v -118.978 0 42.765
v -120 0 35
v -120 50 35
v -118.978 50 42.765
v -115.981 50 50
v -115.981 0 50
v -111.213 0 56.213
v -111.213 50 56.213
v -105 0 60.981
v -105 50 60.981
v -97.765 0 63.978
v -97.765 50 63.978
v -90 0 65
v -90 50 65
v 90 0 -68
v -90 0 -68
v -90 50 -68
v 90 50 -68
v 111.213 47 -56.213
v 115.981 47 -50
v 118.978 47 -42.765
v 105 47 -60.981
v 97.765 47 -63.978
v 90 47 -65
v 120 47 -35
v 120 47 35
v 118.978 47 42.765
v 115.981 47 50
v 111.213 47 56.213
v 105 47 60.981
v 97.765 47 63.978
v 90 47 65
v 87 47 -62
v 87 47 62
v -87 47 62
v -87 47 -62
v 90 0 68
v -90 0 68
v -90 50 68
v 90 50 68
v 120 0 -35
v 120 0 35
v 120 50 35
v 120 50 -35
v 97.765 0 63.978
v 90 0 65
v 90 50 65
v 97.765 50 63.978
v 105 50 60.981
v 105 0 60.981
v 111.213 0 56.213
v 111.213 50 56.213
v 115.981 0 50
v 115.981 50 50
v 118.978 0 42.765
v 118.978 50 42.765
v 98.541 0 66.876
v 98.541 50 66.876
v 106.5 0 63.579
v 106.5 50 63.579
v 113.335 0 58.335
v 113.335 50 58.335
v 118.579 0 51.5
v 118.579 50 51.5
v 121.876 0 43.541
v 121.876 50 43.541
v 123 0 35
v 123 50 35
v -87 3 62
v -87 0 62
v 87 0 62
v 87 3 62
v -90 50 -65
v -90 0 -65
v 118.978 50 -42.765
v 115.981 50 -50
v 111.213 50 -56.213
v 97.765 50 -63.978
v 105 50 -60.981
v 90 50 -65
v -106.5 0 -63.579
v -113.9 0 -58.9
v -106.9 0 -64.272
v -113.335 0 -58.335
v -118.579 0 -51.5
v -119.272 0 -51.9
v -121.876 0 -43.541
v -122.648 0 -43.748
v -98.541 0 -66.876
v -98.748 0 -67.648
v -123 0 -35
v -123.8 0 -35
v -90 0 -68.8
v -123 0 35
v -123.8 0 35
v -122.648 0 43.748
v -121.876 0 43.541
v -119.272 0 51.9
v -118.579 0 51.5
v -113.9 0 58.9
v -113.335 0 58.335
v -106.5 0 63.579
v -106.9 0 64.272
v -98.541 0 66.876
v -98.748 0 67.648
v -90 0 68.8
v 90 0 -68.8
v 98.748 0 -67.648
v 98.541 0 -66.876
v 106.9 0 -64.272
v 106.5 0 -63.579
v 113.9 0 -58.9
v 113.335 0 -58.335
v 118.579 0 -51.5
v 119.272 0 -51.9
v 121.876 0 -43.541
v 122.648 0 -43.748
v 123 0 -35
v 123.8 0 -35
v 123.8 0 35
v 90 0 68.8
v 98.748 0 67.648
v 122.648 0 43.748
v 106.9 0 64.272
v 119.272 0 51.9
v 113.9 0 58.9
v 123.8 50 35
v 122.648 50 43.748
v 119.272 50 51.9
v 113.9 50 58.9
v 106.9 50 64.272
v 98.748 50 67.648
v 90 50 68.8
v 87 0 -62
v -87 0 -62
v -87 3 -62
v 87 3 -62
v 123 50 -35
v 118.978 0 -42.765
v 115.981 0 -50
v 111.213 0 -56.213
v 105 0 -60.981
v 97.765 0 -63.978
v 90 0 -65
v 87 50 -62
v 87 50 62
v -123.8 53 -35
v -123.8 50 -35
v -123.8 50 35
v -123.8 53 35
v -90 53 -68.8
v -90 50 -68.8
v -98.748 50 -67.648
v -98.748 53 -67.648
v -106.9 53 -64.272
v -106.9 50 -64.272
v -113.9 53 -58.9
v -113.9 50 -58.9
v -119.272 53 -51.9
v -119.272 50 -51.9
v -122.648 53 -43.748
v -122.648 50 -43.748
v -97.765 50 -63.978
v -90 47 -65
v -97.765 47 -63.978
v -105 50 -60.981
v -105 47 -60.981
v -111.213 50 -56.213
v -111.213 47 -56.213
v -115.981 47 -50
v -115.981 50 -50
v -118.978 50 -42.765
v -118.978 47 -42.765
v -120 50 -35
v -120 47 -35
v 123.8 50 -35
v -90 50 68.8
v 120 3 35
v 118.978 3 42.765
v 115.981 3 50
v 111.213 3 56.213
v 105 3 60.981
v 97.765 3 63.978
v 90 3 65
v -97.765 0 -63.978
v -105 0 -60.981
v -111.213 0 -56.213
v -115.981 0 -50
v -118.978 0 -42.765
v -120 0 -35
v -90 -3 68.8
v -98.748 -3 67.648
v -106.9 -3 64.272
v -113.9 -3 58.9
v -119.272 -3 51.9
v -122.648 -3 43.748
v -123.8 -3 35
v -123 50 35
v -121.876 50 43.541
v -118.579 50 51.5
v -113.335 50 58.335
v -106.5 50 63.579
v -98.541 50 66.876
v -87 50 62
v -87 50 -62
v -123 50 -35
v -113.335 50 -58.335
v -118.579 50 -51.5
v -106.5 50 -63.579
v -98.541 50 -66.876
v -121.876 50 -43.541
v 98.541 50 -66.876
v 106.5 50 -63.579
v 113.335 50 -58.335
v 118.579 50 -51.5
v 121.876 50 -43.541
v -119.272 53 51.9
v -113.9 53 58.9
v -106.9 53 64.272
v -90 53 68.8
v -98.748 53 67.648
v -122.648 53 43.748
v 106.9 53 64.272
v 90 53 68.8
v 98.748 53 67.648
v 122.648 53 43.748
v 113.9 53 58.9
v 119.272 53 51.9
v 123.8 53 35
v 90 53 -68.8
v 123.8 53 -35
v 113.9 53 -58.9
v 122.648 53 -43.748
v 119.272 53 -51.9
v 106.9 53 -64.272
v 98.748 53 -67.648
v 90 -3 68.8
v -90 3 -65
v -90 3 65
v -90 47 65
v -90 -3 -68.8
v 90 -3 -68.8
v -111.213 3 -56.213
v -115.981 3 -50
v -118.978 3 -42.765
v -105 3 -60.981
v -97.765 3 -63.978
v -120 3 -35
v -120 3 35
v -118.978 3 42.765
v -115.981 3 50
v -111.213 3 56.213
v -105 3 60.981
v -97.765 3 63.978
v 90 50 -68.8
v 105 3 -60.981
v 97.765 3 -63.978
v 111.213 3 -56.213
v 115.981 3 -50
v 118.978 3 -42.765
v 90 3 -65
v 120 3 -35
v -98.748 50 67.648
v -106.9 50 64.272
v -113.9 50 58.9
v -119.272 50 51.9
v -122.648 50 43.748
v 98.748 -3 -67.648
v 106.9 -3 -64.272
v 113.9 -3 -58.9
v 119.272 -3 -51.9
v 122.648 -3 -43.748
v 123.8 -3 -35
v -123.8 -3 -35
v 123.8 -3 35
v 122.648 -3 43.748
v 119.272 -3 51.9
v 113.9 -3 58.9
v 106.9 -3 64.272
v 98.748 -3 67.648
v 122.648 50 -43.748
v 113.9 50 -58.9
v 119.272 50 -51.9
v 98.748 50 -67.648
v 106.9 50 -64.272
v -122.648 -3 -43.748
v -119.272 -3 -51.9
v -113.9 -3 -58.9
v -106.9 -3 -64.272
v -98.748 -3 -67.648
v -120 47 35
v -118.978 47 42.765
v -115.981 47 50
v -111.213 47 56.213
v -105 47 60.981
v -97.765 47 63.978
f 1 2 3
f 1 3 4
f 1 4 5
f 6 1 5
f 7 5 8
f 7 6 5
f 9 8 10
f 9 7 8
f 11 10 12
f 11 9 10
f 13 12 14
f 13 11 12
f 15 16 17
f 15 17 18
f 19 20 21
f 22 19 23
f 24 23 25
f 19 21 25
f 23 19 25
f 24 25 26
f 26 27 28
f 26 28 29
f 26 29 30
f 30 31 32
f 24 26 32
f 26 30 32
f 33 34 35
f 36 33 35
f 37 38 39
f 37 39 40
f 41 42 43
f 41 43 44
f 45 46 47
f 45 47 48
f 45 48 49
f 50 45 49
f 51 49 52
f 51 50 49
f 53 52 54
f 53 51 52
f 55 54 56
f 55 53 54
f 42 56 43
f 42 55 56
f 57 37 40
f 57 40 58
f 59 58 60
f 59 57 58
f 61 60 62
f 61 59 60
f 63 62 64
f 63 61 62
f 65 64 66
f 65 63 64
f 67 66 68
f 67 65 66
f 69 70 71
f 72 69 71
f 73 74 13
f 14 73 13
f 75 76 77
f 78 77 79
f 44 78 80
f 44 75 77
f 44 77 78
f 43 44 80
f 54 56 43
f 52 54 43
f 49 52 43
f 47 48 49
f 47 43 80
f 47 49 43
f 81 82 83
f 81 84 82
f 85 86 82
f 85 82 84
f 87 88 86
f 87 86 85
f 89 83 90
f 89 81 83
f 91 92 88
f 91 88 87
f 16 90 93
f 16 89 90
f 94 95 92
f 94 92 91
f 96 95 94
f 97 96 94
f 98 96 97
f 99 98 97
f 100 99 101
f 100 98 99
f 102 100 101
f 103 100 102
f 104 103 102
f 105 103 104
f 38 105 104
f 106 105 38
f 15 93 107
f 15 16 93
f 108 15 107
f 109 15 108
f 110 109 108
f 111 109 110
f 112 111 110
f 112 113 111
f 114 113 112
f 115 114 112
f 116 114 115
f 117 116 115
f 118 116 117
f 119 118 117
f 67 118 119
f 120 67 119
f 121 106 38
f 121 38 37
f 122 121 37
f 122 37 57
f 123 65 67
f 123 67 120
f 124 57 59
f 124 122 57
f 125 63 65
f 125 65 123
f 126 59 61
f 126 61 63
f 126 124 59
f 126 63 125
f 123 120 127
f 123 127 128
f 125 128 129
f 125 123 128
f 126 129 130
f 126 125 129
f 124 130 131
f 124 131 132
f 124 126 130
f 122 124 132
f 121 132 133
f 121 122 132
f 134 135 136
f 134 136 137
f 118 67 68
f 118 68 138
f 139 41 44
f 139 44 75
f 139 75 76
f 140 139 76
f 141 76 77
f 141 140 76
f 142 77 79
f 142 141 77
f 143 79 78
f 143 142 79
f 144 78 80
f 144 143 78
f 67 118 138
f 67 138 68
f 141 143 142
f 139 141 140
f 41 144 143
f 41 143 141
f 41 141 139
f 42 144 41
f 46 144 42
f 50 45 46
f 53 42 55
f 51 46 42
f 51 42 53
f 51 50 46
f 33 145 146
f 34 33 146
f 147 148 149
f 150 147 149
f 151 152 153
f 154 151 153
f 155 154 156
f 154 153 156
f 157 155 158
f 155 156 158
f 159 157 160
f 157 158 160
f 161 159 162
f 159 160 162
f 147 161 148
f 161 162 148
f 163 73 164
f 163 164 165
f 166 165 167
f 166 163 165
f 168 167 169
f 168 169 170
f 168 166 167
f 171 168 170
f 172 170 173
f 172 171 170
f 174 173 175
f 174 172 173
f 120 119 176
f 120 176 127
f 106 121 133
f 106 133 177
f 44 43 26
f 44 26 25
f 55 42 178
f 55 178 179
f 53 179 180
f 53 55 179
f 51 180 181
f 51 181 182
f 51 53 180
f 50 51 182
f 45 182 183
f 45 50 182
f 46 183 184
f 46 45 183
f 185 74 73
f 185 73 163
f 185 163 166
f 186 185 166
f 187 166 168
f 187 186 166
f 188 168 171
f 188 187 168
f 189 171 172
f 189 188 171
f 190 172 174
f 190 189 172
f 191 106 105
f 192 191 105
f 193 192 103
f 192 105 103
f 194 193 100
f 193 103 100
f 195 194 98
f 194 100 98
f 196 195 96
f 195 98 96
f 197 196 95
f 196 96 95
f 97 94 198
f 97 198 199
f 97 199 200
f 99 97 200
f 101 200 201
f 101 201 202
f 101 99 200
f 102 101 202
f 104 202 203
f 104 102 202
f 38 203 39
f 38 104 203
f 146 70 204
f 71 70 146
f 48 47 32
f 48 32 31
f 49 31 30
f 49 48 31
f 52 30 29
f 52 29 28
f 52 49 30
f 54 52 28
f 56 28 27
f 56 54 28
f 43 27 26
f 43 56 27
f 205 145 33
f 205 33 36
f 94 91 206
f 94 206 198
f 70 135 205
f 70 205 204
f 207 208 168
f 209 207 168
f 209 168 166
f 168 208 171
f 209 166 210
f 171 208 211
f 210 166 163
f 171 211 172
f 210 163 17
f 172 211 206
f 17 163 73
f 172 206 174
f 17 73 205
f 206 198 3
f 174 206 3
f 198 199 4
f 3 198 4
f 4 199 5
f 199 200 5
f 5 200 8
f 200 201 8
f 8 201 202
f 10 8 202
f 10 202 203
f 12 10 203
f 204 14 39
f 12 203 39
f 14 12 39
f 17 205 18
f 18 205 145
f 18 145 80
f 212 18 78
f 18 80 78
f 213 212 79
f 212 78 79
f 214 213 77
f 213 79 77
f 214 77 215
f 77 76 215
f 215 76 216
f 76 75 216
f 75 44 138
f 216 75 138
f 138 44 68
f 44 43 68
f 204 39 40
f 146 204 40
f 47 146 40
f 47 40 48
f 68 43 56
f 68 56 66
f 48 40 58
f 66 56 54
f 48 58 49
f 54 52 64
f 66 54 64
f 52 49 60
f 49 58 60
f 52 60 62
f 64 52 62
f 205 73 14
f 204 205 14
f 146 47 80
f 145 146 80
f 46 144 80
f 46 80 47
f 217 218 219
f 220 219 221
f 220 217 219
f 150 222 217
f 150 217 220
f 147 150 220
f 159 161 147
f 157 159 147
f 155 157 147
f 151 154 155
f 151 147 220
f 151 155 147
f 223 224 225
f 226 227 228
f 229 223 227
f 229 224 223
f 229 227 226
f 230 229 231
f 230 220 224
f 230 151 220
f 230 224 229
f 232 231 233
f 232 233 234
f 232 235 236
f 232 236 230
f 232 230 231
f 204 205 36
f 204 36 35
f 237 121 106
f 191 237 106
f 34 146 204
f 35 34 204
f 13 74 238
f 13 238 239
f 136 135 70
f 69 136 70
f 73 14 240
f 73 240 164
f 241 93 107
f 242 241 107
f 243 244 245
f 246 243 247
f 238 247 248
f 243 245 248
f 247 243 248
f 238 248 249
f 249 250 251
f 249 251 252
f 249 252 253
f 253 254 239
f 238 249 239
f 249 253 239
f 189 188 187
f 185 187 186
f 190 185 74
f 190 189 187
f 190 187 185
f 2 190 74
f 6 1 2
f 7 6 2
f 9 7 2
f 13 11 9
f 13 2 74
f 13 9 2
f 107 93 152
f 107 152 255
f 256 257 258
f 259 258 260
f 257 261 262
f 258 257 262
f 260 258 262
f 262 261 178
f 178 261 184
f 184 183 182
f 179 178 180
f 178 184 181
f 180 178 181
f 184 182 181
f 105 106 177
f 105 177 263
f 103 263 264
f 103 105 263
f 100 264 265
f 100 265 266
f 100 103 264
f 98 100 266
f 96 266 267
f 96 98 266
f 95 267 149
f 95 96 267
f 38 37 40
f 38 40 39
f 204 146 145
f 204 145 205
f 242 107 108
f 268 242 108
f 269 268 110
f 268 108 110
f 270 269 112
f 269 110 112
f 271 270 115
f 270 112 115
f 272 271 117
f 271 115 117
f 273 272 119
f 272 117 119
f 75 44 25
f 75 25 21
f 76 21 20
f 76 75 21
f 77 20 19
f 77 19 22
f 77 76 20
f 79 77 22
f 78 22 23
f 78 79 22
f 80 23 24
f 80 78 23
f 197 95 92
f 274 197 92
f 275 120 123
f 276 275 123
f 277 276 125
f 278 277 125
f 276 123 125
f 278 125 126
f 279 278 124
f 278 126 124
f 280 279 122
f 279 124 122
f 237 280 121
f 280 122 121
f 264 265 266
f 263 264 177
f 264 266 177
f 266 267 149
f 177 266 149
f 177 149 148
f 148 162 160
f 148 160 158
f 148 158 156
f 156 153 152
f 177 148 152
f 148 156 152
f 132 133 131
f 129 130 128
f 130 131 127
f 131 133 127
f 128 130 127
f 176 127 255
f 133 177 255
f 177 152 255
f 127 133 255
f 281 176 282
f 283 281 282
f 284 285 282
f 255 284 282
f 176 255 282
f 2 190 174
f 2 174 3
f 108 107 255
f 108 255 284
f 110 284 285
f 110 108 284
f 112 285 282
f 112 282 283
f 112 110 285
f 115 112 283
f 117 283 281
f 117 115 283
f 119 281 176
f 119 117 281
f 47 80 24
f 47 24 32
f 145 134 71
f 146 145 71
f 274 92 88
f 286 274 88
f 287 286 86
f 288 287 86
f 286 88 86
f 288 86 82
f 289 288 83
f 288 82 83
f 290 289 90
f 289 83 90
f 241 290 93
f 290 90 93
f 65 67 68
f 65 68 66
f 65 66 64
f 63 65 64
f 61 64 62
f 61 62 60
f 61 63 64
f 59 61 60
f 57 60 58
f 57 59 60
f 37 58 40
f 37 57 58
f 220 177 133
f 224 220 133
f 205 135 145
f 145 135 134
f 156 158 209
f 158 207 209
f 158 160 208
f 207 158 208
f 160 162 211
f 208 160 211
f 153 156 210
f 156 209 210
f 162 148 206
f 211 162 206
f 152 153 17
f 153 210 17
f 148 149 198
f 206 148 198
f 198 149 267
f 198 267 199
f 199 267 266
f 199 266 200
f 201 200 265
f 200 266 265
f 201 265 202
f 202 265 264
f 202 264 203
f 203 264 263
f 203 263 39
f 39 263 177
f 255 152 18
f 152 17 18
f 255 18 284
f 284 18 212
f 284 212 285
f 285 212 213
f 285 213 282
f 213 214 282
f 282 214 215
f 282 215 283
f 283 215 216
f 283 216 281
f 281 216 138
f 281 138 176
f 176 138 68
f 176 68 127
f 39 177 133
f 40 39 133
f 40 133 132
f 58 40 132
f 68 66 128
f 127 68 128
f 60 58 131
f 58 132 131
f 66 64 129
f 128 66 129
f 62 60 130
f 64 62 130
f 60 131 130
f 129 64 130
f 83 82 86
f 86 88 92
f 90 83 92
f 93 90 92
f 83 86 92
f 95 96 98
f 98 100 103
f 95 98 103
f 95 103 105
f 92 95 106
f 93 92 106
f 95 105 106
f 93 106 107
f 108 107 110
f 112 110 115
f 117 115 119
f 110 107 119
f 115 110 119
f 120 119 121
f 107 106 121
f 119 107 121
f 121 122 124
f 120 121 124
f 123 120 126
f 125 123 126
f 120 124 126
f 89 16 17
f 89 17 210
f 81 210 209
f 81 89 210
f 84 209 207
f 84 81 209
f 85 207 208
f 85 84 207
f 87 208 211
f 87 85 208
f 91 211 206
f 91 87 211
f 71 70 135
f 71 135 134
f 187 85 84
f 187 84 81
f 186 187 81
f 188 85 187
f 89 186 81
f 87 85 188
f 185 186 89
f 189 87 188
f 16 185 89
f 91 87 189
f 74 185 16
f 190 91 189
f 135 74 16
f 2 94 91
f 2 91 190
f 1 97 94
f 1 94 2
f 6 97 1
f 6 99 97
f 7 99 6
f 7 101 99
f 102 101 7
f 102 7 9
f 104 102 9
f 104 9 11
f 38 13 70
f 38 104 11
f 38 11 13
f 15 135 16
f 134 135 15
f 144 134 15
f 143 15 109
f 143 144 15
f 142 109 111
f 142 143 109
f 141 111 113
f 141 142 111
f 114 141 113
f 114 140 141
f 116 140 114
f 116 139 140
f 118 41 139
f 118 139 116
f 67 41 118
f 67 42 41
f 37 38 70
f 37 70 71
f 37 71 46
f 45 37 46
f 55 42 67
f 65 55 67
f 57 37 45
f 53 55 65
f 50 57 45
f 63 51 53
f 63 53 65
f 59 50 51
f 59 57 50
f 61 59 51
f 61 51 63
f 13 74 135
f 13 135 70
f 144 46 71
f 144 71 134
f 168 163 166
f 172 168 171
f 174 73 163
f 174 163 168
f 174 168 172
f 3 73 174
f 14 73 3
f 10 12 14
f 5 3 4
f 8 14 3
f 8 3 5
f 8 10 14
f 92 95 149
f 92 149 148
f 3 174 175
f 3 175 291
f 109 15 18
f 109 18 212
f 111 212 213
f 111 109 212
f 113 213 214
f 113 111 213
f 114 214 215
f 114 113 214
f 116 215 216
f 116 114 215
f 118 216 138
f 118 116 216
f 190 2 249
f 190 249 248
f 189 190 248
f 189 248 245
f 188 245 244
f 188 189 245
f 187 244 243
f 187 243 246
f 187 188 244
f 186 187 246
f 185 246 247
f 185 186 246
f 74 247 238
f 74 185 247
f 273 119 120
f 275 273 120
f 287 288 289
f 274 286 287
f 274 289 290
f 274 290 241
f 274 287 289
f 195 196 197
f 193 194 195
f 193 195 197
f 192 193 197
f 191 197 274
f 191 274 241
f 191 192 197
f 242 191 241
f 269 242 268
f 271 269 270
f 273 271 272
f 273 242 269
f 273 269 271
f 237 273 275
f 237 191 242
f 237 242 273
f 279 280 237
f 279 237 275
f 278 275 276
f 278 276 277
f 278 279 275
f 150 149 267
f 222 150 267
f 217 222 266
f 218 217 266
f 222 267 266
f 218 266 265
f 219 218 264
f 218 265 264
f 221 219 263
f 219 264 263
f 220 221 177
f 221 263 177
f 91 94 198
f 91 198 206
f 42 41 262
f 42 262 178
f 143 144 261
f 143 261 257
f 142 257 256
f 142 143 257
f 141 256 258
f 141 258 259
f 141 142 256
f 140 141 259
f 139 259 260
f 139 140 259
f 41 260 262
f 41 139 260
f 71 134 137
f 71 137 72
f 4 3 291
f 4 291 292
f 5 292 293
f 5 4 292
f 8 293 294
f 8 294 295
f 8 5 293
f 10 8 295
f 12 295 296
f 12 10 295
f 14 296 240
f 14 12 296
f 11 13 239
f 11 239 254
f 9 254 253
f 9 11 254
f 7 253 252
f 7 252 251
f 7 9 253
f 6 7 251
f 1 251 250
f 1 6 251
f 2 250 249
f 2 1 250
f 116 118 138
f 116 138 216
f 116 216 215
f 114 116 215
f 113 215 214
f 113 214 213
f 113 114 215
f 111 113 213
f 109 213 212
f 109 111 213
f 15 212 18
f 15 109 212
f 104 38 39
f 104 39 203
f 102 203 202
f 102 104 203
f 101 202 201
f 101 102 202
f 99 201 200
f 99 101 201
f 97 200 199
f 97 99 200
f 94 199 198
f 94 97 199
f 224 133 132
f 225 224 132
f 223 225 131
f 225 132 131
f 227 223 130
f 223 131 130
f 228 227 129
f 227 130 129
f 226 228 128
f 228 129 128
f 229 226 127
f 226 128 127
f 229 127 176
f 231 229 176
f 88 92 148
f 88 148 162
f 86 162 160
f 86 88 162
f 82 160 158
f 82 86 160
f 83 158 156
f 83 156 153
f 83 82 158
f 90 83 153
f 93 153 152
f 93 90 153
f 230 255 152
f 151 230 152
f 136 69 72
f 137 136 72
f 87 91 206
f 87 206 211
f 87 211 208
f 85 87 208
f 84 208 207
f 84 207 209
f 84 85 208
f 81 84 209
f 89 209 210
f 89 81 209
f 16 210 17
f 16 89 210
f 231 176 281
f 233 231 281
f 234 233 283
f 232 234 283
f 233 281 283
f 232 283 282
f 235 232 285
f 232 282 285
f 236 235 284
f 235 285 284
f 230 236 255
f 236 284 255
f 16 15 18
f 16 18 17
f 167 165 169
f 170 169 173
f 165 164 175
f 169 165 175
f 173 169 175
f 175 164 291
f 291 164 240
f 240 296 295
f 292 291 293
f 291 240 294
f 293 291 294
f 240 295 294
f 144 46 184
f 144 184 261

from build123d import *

# Parameters (mm, degrees)
F0_W     = 180
F0_H     = 130
F0_W_2   = 174
F0_H_2   = 124
F1_DEPTH = 50
F2_DEPTH = 3
F3_DEPTH = 3
F4_DEPTH = 50
F5_W     = 174
F5_H     = 124
F6_DEPTH = 3
F7_DEPTH = 3


with BuildPart() as f1:
    # F0 (on Front) → F1 (new body)
    with BuildSketch(Plane.XZ):
        with BuildLine():
            ThreePointArc((-90, 68), (-113.3345237792, 58.3345237792), (-123, 35))
            Line((-123, 35), (-123, -35))
            ThreePointArc((-123, -35), (-113.3345237792, -58.3345237792), (-90, -68))
            Line((-90, -68), (90, -68))
            ThreePointArc((90, -68), (113.3345237792, -58.3345237792), (123, -35))
            Line((123, -35), (123, 35))
            ThreePointArc((123, 35), (113.3345237792, 58.3345237792), (90, 68))
            Line((90, 68), (-90, 68))
        make_face()
        with BuildLine():
            Line((-90, 65), (90, 65))
            ThreePointArc((90, 65), (111.2132034356, 56.2132034356), (120, 35))
            Line((120, 35), (120, -35))
            ThreePointArc((120, -35), (111.2132034356, -56.2132034356), (90, -65))
            Line((90, -65), (-90, -65))
            ThreePointArc((-90, -65), (-111.2132034356, -56.2132034356), (-120, -35))
            Line((-120, -35), (-120, 35))
            ThreePointArc((-120, 35), (-111.2132034356, 56.2132034356), (-90, 65))
        make_face(mode=Mode.SUBTRACT)
        Rectangle(F0_W, F0_H)
        Rectangle(F0_W_2, F0_H_2, mode=Mode.SUBTRACT)
    extrude(amount=-F1_DEPTH)


with BuildPart() as f2:
    # F0 (on Front) → F2 (new body)
    with BuildSketch(Plane.XZ):
        Rectangle(F0_W_2, F0_H_2)
    extrude(amount=-F2_DEPTH)


with BuildPart() as f2b:
    # F0 (on Front) → F2, piece 2 (new body)
    with BuildSketch(Plane.XZ):
        with BuildLine():
            Line((-90, -65), (-90, 65))
            ThreePointArc((-90, 65), (-111.2132034356, 56.2132034356), (-120, 35))
            Line((-120, 35), (-120, -35))
            ThreePointArc((-120, -35), (-111.2132034356, -56.2132034356), (-90, -65))
        make_face()
    extrude(amount=-F2_DEPTH)


with BuildPart() as f2c:
    # F0 (on Front) → F2, piece 3 (new body)
    with BuildSketch(Plane.XZ):
        with BuildLine():
            ThreePointArc((120, 35), (111.2132034356, 56.2132034356), (90, 65))
            Line((90, 65), (90, -65))
            ThreePointArc((90, -65), (111.2132034356, -56.2132034356), (120, -35))
            Line((120, -35), (120, 35))
        make_face()
    extrude(amount=-F2_DEPTH)


with BuildPart() as f3:
    # F0 (on Front) → F3 (new body)
    with BuildSketch(Plane.XZ):
        with BuildLine():
            ThreePointArc((123.8, 35), (113.9002092041, 58.9002092041), (90, 68.8))
            Line((90, 68.8), (-90, 68.8))
            ThreePointArc((-90, 68.8), (-113.9002092041, 58.9002092041), (-123.8, 35))
            Line((-123.8, 35), (-123.8, -35))
            ThreePointArc((-123.8, -35), (-113.9002092041, -58.9002092041), (-90, -68.8))
            Line((-90, -68.8), (90, -68.8))
            ThreePointArc((90, -68.8), (113.9002092041, -58.9002092041), (123.8, -35))
            Line((123.8, -35), (123.8, 35))
        make_face()
        with BuildLine():
            Line((-123, -35), (-123, 35))
            ThreePointArc((-123, 35), (-113.3345237792, 58.3345237792), (-90, 68))
            Line((-90, 68), (90, 68))
            ThreePointArc((90, 68), (113.3345237792, 58.3345237792), (123, 35))
            Line((123, 35), (123, -35))
            ThreePointArc((123, -35), (113.3345237792, -58.3345237792), (90, -68))
            Line((90, -68), (-90, -68))
            ThreePointArc((-90, -68), (-113.3345237792, -58.3345237792), (-123, -35))
        make_face(mode=Mode.SUBTRACT)
        with BuildLine():
            ThreePointArc((-90, 68), (-113.3345237792, 58.3345237792), (-123, 35))
            Line((-123, 35), (-123, -35))
            ThreePointArc((-123, -35), (-113.3345237792, -58.3345237792), (-90, -68))
            Line((-90, -68), (90, -68))
            ThreePointArc((90, -68), (113.3345237792, -58.3345237792), (123, -35))
            Line((123, -35), (123, 35))
            ThreePointArc((123, 35), (113.3345237792, 58.3345237792), (90, 68))
            Line((90, 68), (-90, 68))
        make_face()
        with BuildLine():
            Line((-90, 65), (90, 65))
            ThreePointArc((90, 65), (111.2132034356, 56.2132034356), (120, 35))
            Line((120, 35), (120, -35))
            ThreePointArc((120, -35), (111.2132034356, -56.2132034356), (90, -65))
            Line((90, -65), (-90, -65))
            ThreePointArc((-90, -65), (-111.2132034356, -56.2132034356), (-120, -35))
            Line((-120, -35), (-120, 35))
            ThreePointArc((-120, 35), (-111.2132034356, 56.2132034356), (-90, 65))
        make_face(mode=Mode.SUBTRACT)
        Rectangle(F0_W, F0_H)
        Rectangle(F0_W_2, F0_H_2, mode=Mode.SUBTRACT)
        Rectangle(F0_W_2, F0_H_2)
        with BuildLine():
            Line((-90, -65), (-90, 65))
            ThreePointArc((-90, 65), (-111.2132034356, 56.2132034356), (-120, 35))
            Line((-120, 35), (-120, -35))
            ThreePointArc((-120, -35), (-111.2132034356, -56.2132034356), (-90, -65))
        make_face()
        with BuildLine():
            ThreePointArc((120, 35), (111.2132034356, 56.2132034356), (90, 65))
            Line((90, 65), (90, -65))
            ThreePointArc((90, -65), (111.2132034356, -56.2132034356), (120, -35))
            Line((120, -35), (120, 35))
        make_face()
    extrude(amount=F3_DEPTH)


with BuildPart() as f4:
    # F0 (on Front) → F4 (new body)
    with BuildSketch(Plane.XZ):
        with BuildLine():
            ThreePointArc((123.8, 35), (113.9002092041, 58.9002092041), (90, 68.8))
            Line((90, 68.8), (-90, 68.8))
            ThreePointArc((-90, 68.8), (-113.9002092041, 58.9002092041), (-123.8, 35))
            Line((-123.8, 35), (-123.8, -35))
            ThreePointArc((-123.8, -35), (-113.9002092041, -58.9002092041), (-90, -68.8))
            Line((-90, -68.8), (90, -68.8))
            ThreePointArc((90, -68.8), (113.9002092041, -58.9002092041), (123.8, -35))
            Line((123.8, -35), (123.8, 35))
        make_face()
        with BuildLine():
            Line((-123, -35), (-123, 35))
            ThreePointArc((-123, 35), (-113.3345237792, 58.3345237792), (-90, 68))
            Line((-90, 68), (90, 68))
            ThreePointArc((90, 68), (113.3345237792, 58.3345237792), (123, 35))
            Line((123, 35), (123, -35))
            ThreePointArc((123, -35), (113.3345237792, -58.3345237792), (90, -68))
            Line((90, -68), (-90, -68))
            ThreePointArc((-90, -68), (-113.3345237792, -58.3345237792), (-123, -35))
        make_face(mode=Mode.SUBTRACT)
    extrude(amount=-F4_DEPTH)


with BuildPart() as f6:
    # F5 (on face) → F6 (new body)
    with BuildSketch(Plane(origin=(0, 50, 0), x_dir=(-1, 0, 0), z_dir=(0, 1, 0))):
        Rectangle(F5_W, F5_H)
    extrude(amount=-F6_DEPTH)


with BuildPart() as f6b:
    # F5 (on face) → F6, piece 2 (new body)
    with BuildSketch(Plane(origin=(0, 50, 0), x_dir=(-1, 0, 0), z_dir=(0, 1, 0))):
        with BuildLine():
            ThreePointArc((120, 35), (111.2132034356, 56.2132034356), (90, 65))
            Line((90, 65), (90, -65))
            ThreePointArc((90, -65), (111.2132034356, -56.2132034356), (120, -35))
            Line((120, -35), (120, 35))
        make_face()
    extrude(amount=-F6_DEPTH)


with BuildPart() as f6c:
    # F5 (on face) → F6, piece 3 (new body)
    with BuildSketch(Plane(origin=(0, 50, 0), x_dir=(-1, 0, 0), z_dir=(0, 1, 0))):
        with BuildLine():
            ThreePointArc((-90, 65), (-111.2132034356, 56.2132034356), (-120, 35))
            Line((-120, 35), (-120, -35))
            ThreePointArc((-120, -35), (-111.2132034356, -56.2132034356), (-90, -65))
            Line((-90, -65), (-90, 65))
        make_face()
    extrude(amount=-F6_DEPTH)


with BuildPart() as f7:
    # F5 (on face) + F4_face (on face) → F7 (new body)
    with BuildSketch(Plane(origin=(0, 50, 0), x_dir=(-1, 0, 0), z_dir=(0, 1, 0))):
        with BuildLine():
            Line((123, -35), (123, 35))
            ThreePointArc((123, 35), (113.3345237792, 58.3345237792), (90, 68))
            Line((90, 68), (-90, 68))
            ThreePointArc((-90, 68), (-113.3345237792, 58.3345237792), (-123, 35))
            Line((-123, 35), (-123, -35))
            ThreePointArc((-123, -35), (-113.3345237792, -58.3345237792), (-90, -68))
            Line((-90, -68), (90, -68))
            ThreePointArc((90, -68), (113.3345237792, -58.3345237792), (123, -35))
        make_face()
        with BuildLine():
            Line((-120, -35), (-120, 35))
            ThreePointArc((-120, 35), (-111.2132034356, 56.2132034356), (-90, 65))
            Line((-90, 65), (-90, -65))
            ThreePointArc((-90, -65), (-111.2132034356, -56.2132034356), (-120, -35))
        make_face(mode=Mode.SUBTRACT)
        Rectangle(F5_W, F5_H, mode=Mode.SUBTRACT)
        with BuildLine():
            Line((90, -65), (90, 65))
            ThreePointArc((90, 65), (111.2132034356, 56.2132034356), (120, 35))
            Line((120, 35), (120, -35))
            ThreePointArc((120, -35), (111.2132034356, -56.2132034356), (90, -65))
        make_face(mode=Mode.SUBTRACT)
        Rectangle(F5_W, F5_H)
        with BuildLine():
            ThreePointArc((-90, 65), (-111.2132034356, 56.2132034356), (-120, 35))
            Line((-120, 35), (-120, -35))
            ThreePointArc((-120, -35), (-111.2132034356, -56.2132034356), (-90, -65))
            Line((-90, -65), (-90, 65))
        make_face()
        with BuildLine():
            ThreePointArc((120, 35), (111.2132034356, 56.2132034356), (90, 65))
            Line((90, 65), (90, -65))
            ThreePointArc((90, -65), (111.2132034356, -56.2132034356), (120, -35))
            Line((120, -35), (120, 35))
        make_face()
    with BuildSketch(Plane(origin=(0, 50, 0), x_dir=(1, 0, 0), z_dir=(0, 1, 0))):
        with BuildLine():
            ThreePointArc((90, -68.8), (113.9002092041, -58.9002092041), (123.8, -35))
            Line((123.8, -35), (123.8, 35))
            ThreePointArc((123.8, 35), (113.9002092041, 58.9002092041), (90, 68.8))
            Line((90, 68.8), (-90, 68.8))
            ThreePointArc((-90, 68.8), (-113.9002092041, 58.9002092041), (-123.8, 35))
            Line((-123.8, 35), (-123.8, -35))
            ThreePointArc((-123.8, -35), (-113.9002092041, -58.9002092041), (-90, -68.8))
            Line((-90, -68.8), (90, -68.8))
        make_face()
        with BuildLine():
            Line((-123, -35), (-123, 35))
            ThreePointArc((-123, 35), (-113.3345237792, 58.3345237792), (-90, 68))
            Line((-90, 68), (90, 68))
            ThreePointArc((90, 68), (113.3345237792, 58.3345237792), (123, 35))
            Line((123, 35), (123, -35))
            ThreePointArc((123, -35), (113.3345237792, -58.3345237792), (90, -68))
            Line((90, -68), (-90, -68))
            ThreePointArc((-90, -68), (-113.3345237792, -58.3345237792), (-123, -35))
        make_face(mode=Mode.SUBTRACT)
    extrude(amount=F7_DEPTH)


solid = Compound([f1.part, f2.part, f2b.part, f2c.part, f3.part, f4.part, f6.part, f6b.part, f6c.part, f7.part])
